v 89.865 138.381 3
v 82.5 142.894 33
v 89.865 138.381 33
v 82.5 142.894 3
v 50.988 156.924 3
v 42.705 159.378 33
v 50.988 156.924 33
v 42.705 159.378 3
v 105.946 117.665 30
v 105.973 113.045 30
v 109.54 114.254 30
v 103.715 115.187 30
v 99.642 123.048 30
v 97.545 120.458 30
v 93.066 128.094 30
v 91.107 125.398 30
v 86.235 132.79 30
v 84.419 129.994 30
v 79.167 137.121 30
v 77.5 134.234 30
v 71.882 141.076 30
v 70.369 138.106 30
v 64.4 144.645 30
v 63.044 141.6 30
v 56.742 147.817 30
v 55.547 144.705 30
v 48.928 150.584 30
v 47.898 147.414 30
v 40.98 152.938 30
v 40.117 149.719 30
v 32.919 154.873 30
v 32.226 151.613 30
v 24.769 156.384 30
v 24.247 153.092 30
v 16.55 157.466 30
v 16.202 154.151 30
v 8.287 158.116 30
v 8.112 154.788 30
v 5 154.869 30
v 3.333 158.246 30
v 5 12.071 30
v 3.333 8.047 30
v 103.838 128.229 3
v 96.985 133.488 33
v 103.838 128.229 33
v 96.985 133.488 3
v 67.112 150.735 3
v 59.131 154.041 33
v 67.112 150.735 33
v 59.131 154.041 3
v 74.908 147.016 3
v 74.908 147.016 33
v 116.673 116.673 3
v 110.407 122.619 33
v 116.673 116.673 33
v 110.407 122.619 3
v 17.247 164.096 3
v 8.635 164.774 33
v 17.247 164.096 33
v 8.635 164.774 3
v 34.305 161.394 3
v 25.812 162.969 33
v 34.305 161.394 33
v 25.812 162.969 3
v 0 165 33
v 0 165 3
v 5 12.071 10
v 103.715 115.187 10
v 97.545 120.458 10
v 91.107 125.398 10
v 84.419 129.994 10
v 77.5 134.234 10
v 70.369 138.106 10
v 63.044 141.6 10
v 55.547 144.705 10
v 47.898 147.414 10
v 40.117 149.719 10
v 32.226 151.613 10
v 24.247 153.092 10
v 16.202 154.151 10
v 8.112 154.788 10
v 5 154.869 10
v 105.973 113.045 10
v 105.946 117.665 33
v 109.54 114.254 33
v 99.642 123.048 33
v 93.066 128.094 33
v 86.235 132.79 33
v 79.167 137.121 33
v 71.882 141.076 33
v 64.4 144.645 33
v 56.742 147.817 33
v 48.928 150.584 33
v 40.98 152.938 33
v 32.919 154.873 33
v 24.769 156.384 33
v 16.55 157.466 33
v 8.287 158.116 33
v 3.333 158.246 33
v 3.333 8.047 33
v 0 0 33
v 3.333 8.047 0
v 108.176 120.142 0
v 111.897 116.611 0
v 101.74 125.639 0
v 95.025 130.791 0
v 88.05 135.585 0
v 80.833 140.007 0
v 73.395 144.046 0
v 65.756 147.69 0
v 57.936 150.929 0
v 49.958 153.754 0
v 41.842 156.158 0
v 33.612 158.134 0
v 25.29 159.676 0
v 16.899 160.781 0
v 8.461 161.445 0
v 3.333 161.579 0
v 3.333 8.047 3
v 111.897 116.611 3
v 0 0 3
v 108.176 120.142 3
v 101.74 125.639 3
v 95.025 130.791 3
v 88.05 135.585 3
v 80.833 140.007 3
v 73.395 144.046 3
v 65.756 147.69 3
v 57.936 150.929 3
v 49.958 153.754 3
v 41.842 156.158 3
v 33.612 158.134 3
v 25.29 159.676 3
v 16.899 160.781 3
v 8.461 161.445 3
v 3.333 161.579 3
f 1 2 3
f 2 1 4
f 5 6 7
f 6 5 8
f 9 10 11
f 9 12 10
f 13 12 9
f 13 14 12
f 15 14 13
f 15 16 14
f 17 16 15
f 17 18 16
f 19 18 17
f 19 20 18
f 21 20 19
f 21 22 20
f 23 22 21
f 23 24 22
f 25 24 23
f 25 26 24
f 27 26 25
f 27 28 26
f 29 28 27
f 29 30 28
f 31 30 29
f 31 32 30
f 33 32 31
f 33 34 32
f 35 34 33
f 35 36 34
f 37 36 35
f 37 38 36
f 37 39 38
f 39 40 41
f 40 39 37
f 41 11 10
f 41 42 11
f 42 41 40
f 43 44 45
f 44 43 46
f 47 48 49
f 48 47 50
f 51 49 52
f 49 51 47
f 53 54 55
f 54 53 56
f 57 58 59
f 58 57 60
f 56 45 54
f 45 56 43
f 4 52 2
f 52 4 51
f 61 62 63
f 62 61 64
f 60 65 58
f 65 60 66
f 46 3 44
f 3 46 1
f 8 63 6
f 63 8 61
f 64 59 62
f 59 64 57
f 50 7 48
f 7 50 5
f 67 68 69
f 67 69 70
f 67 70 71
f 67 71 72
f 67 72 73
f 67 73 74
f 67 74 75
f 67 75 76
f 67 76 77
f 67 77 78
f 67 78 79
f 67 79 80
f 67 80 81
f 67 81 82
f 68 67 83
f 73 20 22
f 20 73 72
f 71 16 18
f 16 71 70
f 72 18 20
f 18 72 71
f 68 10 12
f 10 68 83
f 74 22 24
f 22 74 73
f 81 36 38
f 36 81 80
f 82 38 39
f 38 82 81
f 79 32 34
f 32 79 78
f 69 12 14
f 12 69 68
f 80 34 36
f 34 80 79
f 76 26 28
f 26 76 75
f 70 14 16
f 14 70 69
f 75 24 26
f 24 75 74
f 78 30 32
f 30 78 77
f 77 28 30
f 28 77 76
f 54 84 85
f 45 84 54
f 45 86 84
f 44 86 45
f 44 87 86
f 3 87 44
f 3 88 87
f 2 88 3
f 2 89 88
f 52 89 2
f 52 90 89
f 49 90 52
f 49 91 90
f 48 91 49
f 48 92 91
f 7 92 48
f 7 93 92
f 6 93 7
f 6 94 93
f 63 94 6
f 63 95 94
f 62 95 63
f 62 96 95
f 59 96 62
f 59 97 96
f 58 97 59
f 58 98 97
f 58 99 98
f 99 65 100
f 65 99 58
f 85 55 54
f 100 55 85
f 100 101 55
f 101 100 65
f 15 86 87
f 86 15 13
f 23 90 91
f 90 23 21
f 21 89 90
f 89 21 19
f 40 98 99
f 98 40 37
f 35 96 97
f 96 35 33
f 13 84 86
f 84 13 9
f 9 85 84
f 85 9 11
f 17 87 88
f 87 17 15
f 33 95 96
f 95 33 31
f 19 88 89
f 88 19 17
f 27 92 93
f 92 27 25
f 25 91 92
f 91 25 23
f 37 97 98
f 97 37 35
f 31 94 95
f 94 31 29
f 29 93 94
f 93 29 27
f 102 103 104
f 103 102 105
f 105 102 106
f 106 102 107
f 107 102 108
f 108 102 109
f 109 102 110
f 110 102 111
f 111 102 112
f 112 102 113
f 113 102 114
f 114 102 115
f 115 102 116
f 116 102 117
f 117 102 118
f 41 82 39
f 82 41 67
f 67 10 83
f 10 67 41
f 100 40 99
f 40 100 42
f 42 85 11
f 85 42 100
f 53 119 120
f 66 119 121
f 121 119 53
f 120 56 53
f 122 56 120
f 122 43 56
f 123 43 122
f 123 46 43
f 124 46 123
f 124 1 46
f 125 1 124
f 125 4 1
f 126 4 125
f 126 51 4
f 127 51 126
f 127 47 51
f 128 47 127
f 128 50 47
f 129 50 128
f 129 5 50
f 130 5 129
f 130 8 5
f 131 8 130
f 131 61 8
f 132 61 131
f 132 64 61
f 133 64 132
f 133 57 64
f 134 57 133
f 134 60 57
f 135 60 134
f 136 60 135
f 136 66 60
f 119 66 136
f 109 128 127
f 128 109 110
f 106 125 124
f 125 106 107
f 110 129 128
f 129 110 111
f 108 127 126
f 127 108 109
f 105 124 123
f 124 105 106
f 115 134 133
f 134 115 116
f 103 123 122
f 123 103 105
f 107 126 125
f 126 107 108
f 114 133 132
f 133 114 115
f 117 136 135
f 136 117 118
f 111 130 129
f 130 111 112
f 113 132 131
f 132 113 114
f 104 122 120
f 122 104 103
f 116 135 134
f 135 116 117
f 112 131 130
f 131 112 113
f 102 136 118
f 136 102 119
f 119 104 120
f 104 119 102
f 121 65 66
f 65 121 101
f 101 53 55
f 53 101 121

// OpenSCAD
union(){
  intersection(){
    cube(1000);
    rotate([0, 0, 45]){
      cube(1000);
    };
    difference(){
      union(){
        cylinder(, h=10, r=165, $fn=120);
        translate([0, 0, 10]){
          difference(){
            cylinder(, h=20, r=165, $fn=120);
            cylinder(, h=20, r=155, $fn=120);
          };
        };
        translate([0, 0, 30]){
          difference(){
            cylinder(, h=3, r=165, $fn=120);
            cylinder(, h=3, r=158.33333333333334, $fn=120);
          };
        };
        rotate([0, 0, 0]){
          translate([0, 0, 0]){
            translate([0, 0, 20]){
              cube([10, 320, 20], true);
            };
          };
        };
        rotate([0, 0, -45]){
          translate([0, 0, 0]){
            translate([0, 0, 20]){
              cube([10, 320, 20], true);
            };
          };
        };
        rotate([0, 0, 0]){
          translate([0, 0, 0]){
            translate([0, 0, 31.5]){
              cube([6.666666666666667, 320, 3], true);
            };
          };
        };
        rotate([0, 0, -45]){
          translate([0, 0, 0]){
            translate([0, 0, 31.5]){
              cube([6.666666666666667, 320, 3], true);
            };
          };
        };
      };
      difference(){
        cylinder(, h=3, r=166.66666666666666, $fn=120);
        cylinder(, h=3, r=161.66666666666666, $fn=120);
      };
      rotate([0, 0, 0]){
        translate([0, 0, 0]){
          translate([0, 0, 1.5]){
            cube([6.666666666666667, 332, 3], true);
          };
        };
      };
      rotate([0, 0, -45]){
        translate([0, 0, 0]){
          translate([0, 0, 1.5]){
            cube([6.666666666666667, 332, 3], true);
          };
        };
      };
    };
  };
};
